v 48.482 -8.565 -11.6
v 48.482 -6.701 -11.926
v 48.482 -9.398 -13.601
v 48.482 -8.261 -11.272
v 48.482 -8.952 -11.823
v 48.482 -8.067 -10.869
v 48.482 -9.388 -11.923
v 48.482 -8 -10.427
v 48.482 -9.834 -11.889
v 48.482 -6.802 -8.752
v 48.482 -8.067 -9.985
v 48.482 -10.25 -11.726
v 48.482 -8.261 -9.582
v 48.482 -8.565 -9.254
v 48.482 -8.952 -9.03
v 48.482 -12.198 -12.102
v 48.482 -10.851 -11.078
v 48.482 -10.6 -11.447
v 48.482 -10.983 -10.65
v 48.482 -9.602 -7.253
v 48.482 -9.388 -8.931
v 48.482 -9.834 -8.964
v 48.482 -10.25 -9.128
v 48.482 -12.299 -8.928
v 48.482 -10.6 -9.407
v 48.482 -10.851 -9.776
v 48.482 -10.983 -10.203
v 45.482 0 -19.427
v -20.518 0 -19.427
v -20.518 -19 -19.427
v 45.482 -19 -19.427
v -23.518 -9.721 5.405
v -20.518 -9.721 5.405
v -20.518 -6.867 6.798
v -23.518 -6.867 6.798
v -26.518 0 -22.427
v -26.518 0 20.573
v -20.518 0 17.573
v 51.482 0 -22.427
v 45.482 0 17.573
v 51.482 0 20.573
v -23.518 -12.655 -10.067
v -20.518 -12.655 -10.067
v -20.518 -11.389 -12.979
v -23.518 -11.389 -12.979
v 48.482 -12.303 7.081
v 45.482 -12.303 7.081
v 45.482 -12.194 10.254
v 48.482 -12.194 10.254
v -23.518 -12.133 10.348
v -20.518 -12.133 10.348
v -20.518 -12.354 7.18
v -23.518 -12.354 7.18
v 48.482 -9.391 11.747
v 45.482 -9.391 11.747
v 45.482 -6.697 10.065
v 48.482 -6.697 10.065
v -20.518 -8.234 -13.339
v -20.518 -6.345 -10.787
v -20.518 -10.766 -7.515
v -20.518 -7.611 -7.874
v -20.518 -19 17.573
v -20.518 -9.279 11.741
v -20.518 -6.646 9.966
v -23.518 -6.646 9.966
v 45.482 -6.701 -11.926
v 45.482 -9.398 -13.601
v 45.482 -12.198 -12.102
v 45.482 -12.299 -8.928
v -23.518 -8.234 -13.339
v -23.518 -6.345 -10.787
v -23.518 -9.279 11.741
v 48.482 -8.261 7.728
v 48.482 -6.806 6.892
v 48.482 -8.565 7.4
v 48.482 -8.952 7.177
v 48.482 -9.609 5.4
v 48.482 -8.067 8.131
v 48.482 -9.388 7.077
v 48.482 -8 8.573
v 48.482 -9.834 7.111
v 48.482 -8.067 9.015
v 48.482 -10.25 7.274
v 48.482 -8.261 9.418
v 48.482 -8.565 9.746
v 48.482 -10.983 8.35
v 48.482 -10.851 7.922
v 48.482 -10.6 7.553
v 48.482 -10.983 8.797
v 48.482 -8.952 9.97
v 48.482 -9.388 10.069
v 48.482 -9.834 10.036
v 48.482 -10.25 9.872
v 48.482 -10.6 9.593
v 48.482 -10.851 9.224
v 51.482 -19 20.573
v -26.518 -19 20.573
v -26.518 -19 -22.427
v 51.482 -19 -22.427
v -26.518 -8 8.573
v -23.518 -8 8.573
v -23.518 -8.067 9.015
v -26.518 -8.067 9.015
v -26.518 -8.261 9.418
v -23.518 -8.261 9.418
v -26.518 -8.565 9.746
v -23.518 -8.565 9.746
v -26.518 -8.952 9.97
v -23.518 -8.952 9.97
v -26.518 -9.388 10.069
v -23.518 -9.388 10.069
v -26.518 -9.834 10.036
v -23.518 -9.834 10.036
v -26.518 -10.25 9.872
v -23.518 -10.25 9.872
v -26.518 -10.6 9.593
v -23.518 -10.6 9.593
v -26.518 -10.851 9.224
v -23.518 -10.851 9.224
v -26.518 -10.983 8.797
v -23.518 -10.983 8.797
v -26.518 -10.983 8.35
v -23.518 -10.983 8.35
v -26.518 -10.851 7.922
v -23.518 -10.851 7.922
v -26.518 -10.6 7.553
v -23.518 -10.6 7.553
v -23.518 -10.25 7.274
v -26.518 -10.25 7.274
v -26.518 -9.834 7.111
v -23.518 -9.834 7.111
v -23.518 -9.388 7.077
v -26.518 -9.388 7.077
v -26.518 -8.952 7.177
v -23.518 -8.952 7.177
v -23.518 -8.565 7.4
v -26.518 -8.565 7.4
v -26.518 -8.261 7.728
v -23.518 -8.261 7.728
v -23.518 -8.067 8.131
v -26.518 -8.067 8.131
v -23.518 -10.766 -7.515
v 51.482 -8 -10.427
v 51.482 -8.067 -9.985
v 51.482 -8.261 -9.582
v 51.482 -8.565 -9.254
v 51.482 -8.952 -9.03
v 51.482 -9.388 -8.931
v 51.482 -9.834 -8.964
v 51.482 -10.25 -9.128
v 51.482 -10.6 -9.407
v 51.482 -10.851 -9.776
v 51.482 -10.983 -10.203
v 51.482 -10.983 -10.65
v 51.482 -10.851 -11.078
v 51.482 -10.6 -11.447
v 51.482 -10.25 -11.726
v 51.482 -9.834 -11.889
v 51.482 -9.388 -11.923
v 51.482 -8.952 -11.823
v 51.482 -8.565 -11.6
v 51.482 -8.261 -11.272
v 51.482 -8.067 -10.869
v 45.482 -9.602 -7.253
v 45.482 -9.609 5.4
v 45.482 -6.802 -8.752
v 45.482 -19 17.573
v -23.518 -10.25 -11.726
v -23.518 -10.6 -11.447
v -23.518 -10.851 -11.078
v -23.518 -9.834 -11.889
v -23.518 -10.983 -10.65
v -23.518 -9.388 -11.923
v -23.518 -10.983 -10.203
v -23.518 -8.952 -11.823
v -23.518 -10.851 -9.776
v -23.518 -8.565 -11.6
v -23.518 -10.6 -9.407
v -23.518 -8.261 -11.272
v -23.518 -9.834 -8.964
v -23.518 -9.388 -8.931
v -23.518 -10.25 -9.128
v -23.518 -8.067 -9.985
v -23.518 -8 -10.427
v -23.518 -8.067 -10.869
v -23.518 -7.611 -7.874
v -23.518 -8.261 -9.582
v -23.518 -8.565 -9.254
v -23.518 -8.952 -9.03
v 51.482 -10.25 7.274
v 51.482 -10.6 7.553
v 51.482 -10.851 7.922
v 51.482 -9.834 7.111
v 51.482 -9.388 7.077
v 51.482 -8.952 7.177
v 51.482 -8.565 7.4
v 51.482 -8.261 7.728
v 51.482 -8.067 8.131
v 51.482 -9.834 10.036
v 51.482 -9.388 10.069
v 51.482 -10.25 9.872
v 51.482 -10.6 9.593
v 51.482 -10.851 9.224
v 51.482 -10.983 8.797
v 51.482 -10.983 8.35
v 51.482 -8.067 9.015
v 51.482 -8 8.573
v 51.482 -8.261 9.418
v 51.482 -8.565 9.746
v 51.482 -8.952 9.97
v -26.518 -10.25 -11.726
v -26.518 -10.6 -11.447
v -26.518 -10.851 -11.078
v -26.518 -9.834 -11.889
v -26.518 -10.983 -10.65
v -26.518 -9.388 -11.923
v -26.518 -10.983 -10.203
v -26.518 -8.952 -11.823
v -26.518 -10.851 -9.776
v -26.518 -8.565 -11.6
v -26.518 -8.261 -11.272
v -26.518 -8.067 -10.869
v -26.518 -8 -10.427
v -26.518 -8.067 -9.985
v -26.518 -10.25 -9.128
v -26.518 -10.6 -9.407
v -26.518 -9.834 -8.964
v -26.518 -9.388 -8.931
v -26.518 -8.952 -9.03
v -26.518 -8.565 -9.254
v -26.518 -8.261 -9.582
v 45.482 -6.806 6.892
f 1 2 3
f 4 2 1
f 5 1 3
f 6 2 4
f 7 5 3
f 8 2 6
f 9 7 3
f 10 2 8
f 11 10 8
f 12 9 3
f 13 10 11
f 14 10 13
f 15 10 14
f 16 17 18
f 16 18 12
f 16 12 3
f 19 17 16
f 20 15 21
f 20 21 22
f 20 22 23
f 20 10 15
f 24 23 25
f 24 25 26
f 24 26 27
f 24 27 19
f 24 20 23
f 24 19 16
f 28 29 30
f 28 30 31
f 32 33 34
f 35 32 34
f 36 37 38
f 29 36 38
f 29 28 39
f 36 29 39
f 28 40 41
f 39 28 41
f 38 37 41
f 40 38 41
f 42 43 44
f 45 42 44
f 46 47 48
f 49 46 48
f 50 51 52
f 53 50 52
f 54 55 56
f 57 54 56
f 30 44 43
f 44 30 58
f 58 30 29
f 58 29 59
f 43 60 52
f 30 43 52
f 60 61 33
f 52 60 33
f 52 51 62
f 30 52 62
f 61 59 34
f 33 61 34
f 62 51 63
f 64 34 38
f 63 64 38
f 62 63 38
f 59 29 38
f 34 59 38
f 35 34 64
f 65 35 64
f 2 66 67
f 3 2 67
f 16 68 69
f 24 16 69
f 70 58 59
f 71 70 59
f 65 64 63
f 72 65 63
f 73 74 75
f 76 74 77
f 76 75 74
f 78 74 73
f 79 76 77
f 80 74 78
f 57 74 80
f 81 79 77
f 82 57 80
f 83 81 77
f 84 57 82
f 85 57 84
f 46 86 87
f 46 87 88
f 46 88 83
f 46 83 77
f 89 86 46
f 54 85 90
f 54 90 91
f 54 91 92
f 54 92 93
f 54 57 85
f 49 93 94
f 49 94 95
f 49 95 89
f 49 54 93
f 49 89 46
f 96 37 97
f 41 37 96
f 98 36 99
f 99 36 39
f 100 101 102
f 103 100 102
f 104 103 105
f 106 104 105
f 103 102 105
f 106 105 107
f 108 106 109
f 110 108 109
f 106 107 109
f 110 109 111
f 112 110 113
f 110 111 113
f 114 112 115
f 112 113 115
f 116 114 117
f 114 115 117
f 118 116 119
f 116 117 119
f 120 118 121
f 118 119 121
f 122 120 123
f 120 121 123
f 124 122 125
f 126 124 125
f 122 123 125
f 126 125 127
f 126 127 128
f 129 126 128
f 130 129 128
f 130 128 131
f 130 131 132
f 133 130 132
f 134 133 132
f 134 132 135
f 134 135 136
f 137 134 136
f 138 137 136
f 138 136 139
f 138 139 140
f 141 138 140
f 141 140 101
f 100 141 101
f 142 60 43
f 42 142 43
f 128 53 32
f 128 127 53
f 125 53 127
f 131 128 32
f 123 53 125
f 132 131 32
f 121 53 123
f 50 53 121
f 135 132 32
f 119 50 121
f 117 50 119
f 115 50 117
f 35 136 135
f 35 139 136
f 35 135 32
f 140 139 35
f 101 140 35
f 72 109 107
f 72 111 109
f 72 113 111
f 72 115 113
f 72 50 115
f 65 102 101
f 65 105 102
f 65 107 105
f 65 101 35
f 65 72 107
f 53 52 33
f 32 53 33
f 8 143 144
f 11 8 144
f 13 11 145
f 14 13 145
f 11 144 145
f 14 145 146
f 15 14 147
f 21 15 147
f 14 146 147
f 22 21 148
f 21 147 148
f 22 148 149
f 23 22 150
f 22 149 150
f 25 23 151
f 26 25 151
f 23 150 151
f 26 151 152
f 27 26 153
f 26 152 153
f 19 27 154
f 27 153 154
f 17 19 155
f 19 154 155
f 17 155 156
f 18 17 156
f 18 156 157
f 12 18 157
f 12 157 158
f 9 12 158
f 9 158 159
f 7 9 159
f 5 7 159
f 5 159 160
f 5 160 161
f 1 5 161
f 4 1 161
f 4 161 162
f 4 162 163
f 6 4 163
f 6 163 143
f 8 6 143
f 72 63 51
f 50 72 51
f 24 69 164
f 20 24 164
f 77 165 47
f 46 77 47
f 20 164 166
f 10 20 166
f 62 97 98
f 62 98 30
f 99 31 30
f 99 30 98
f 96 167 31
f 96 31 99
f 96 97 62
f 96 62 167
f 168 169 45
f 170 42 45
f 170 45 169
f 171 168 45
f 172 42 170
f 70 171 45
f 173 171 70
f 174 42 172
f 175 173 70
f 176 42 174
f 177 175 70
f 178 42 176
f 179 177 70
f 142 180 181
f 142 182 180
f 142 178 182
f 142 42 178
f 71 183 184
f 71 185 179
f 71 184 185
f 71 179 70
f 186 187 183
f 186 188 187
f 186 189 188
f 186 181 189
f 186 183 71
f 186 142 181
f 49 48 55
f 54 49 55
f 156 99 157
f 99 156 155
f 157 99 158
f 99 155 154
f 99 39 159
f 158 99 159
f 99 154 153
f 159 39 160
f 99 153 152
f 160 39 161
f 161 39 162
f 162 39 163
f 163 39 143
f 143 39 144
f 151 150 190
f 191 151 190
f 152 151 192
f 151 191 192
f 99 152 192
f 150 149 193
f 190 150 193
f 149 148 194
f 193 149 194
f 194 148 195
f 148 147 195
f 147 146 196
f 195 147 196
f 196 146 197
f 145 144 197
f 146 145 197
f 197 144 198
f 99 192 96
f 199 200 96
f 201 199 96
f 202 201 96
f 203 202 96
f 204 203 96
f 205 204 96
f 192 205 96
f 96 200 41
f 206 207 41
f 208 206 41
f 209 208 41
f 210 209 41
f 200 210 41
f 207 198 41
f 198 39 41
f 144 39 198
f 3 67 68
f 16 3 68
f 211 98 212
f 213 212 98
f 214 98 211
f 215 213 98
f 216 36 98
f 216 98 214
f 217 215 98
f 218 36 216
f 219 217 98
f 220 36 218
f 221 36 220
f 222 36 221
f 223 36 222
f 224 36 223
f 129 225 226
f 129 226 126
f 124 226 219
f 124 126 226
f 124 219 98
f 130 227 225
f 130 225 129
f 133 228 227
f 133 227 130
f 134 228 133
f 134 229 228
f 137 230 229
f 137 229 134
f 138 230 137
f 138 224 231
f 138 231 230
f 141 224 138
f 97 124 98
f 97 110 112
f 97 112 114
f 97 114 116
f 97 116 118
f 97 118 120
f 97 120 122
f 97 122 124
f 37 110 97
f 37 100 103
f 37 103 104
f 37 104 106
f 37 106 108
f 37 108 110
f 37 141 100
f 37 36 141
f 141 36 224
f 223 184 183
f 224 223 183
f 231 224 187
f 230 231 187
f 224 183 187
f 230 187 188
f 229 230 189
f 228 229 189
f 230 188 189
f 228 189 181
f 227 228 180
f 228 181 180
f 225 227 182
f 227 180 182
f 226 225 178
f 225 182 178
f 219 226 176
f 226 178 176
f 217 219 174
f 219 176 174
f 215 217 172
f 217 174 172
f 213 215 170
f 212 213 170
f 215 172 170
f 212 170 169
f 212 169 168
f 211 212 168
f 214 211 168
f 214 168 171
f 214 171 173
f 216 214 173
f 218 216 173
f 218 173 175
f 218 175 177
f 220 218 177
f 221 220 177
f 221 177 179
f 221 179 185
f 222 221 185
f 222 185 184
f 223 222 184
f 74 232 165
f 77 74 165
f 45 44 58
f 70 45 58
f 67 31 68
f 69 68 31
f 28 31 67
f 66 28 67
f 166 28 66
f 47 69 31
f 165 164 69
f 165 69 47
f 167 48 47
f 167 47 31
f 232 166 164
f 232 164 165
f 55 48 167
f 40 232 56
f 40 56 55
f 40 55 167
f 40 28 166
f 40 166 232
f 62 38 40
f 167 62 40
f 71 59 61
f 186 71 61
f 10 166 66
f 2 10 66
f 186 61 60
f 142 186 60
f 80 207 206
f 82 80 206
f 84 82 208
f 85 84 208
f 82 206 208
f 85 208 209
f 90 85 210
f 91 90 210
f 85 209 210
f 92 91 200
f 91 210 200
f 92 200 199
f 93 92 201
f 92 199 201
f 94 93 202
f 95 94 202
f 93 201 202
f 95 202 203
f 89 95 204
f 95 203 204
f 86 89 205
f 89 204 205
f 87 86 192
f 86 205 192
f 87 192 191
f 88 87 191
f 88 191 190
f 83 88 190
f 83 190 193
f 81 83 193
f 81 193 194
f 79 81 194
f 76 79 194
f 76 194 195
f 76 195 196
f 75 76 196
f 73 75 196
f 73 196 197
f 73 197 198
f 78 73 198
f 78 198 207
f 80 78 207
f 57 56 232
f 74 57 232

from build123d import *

# Parameters (mm, degrees)
F0_W     = 78
F0_H     = 43
F0_W_2   = 66
F0_H_2   = 37
F1_DEPTH = 19
F2_R     = 1.5
F3_DEPTH = 78
F5_DEPTH = 3
F7_DEPTH = 3


with BuildPart() as f1:
    # F0 (on Front) → F1 (new body)
    with BuildSketch(Plane.XZ):
        with Locations((12.482391, -0.926793)):
            Rectangle(F0_W, F0_H)
        with Locations((12.482391, -0.926793)):
            Rectangle(F0_W_2, F0_H_2, mode=Mode.SUBTRACT)
    extrude(amount=F1_DEPTH)

    # F2 (on face) → F3 (cut)
    with BuildSketch(Plane.YZ.offset(51.482391)):
        with Locations((-9.5, 8.573207)):
            Circle(F2_R)
        with Locations((-9.5, -10.426793)):
            Circle(F2_R)
    extrude(amount=-F3_DEPTH, mode=Mode.SUBTRACT)

    # F4 (on face) → F5 (cut)
    with BuildSketch(Plane.YZ.offset(-20.517609)):
        Polygon((-6.646372, 9.966096), (-9.279464, 11.740966), (-12.133092, 10.348076), (-12.353628, 7.180317), (-9.720536, 5.405448), (-6.866908, 6.798337), align=None)
        Polygon((-7.610832, -7.874466), (-10.765796, -7.514562), (-12.654965, -10.066889), (-11.389168, -12.979121), (-8.234204, -13.339025), (-6.345035, -10.786698), align=None)
    extrude(amount=-F5_DEPTH, mode=Mode.SUBTRACT)

    # F6 (on face) → F7 (cut)
    with BuildSketch(Plane(origin=(45.482391, 0, 0), x_dir=(0, -1, 0), z_dir=(-1, 0, 0))):
        Polygon((9.609124, 5.399656), (12.302937, 7.080935), (12.193814, 10.254486), (9.390876, 11.746758), (6.697063, 10.065478), (6.806186, 6.891927), align=None)
        Polygon((9.398182, -13.600587), (12.197677, -12.101867), (12.299495, -8.928073), (9.601818, -7.253), (6.802323, -8.75172), (6.700505, -11.925514), align=None)
    extrude(amount=-F7_DEPTH, mode=Mode.SUBTRACT)


solid = f1.part
